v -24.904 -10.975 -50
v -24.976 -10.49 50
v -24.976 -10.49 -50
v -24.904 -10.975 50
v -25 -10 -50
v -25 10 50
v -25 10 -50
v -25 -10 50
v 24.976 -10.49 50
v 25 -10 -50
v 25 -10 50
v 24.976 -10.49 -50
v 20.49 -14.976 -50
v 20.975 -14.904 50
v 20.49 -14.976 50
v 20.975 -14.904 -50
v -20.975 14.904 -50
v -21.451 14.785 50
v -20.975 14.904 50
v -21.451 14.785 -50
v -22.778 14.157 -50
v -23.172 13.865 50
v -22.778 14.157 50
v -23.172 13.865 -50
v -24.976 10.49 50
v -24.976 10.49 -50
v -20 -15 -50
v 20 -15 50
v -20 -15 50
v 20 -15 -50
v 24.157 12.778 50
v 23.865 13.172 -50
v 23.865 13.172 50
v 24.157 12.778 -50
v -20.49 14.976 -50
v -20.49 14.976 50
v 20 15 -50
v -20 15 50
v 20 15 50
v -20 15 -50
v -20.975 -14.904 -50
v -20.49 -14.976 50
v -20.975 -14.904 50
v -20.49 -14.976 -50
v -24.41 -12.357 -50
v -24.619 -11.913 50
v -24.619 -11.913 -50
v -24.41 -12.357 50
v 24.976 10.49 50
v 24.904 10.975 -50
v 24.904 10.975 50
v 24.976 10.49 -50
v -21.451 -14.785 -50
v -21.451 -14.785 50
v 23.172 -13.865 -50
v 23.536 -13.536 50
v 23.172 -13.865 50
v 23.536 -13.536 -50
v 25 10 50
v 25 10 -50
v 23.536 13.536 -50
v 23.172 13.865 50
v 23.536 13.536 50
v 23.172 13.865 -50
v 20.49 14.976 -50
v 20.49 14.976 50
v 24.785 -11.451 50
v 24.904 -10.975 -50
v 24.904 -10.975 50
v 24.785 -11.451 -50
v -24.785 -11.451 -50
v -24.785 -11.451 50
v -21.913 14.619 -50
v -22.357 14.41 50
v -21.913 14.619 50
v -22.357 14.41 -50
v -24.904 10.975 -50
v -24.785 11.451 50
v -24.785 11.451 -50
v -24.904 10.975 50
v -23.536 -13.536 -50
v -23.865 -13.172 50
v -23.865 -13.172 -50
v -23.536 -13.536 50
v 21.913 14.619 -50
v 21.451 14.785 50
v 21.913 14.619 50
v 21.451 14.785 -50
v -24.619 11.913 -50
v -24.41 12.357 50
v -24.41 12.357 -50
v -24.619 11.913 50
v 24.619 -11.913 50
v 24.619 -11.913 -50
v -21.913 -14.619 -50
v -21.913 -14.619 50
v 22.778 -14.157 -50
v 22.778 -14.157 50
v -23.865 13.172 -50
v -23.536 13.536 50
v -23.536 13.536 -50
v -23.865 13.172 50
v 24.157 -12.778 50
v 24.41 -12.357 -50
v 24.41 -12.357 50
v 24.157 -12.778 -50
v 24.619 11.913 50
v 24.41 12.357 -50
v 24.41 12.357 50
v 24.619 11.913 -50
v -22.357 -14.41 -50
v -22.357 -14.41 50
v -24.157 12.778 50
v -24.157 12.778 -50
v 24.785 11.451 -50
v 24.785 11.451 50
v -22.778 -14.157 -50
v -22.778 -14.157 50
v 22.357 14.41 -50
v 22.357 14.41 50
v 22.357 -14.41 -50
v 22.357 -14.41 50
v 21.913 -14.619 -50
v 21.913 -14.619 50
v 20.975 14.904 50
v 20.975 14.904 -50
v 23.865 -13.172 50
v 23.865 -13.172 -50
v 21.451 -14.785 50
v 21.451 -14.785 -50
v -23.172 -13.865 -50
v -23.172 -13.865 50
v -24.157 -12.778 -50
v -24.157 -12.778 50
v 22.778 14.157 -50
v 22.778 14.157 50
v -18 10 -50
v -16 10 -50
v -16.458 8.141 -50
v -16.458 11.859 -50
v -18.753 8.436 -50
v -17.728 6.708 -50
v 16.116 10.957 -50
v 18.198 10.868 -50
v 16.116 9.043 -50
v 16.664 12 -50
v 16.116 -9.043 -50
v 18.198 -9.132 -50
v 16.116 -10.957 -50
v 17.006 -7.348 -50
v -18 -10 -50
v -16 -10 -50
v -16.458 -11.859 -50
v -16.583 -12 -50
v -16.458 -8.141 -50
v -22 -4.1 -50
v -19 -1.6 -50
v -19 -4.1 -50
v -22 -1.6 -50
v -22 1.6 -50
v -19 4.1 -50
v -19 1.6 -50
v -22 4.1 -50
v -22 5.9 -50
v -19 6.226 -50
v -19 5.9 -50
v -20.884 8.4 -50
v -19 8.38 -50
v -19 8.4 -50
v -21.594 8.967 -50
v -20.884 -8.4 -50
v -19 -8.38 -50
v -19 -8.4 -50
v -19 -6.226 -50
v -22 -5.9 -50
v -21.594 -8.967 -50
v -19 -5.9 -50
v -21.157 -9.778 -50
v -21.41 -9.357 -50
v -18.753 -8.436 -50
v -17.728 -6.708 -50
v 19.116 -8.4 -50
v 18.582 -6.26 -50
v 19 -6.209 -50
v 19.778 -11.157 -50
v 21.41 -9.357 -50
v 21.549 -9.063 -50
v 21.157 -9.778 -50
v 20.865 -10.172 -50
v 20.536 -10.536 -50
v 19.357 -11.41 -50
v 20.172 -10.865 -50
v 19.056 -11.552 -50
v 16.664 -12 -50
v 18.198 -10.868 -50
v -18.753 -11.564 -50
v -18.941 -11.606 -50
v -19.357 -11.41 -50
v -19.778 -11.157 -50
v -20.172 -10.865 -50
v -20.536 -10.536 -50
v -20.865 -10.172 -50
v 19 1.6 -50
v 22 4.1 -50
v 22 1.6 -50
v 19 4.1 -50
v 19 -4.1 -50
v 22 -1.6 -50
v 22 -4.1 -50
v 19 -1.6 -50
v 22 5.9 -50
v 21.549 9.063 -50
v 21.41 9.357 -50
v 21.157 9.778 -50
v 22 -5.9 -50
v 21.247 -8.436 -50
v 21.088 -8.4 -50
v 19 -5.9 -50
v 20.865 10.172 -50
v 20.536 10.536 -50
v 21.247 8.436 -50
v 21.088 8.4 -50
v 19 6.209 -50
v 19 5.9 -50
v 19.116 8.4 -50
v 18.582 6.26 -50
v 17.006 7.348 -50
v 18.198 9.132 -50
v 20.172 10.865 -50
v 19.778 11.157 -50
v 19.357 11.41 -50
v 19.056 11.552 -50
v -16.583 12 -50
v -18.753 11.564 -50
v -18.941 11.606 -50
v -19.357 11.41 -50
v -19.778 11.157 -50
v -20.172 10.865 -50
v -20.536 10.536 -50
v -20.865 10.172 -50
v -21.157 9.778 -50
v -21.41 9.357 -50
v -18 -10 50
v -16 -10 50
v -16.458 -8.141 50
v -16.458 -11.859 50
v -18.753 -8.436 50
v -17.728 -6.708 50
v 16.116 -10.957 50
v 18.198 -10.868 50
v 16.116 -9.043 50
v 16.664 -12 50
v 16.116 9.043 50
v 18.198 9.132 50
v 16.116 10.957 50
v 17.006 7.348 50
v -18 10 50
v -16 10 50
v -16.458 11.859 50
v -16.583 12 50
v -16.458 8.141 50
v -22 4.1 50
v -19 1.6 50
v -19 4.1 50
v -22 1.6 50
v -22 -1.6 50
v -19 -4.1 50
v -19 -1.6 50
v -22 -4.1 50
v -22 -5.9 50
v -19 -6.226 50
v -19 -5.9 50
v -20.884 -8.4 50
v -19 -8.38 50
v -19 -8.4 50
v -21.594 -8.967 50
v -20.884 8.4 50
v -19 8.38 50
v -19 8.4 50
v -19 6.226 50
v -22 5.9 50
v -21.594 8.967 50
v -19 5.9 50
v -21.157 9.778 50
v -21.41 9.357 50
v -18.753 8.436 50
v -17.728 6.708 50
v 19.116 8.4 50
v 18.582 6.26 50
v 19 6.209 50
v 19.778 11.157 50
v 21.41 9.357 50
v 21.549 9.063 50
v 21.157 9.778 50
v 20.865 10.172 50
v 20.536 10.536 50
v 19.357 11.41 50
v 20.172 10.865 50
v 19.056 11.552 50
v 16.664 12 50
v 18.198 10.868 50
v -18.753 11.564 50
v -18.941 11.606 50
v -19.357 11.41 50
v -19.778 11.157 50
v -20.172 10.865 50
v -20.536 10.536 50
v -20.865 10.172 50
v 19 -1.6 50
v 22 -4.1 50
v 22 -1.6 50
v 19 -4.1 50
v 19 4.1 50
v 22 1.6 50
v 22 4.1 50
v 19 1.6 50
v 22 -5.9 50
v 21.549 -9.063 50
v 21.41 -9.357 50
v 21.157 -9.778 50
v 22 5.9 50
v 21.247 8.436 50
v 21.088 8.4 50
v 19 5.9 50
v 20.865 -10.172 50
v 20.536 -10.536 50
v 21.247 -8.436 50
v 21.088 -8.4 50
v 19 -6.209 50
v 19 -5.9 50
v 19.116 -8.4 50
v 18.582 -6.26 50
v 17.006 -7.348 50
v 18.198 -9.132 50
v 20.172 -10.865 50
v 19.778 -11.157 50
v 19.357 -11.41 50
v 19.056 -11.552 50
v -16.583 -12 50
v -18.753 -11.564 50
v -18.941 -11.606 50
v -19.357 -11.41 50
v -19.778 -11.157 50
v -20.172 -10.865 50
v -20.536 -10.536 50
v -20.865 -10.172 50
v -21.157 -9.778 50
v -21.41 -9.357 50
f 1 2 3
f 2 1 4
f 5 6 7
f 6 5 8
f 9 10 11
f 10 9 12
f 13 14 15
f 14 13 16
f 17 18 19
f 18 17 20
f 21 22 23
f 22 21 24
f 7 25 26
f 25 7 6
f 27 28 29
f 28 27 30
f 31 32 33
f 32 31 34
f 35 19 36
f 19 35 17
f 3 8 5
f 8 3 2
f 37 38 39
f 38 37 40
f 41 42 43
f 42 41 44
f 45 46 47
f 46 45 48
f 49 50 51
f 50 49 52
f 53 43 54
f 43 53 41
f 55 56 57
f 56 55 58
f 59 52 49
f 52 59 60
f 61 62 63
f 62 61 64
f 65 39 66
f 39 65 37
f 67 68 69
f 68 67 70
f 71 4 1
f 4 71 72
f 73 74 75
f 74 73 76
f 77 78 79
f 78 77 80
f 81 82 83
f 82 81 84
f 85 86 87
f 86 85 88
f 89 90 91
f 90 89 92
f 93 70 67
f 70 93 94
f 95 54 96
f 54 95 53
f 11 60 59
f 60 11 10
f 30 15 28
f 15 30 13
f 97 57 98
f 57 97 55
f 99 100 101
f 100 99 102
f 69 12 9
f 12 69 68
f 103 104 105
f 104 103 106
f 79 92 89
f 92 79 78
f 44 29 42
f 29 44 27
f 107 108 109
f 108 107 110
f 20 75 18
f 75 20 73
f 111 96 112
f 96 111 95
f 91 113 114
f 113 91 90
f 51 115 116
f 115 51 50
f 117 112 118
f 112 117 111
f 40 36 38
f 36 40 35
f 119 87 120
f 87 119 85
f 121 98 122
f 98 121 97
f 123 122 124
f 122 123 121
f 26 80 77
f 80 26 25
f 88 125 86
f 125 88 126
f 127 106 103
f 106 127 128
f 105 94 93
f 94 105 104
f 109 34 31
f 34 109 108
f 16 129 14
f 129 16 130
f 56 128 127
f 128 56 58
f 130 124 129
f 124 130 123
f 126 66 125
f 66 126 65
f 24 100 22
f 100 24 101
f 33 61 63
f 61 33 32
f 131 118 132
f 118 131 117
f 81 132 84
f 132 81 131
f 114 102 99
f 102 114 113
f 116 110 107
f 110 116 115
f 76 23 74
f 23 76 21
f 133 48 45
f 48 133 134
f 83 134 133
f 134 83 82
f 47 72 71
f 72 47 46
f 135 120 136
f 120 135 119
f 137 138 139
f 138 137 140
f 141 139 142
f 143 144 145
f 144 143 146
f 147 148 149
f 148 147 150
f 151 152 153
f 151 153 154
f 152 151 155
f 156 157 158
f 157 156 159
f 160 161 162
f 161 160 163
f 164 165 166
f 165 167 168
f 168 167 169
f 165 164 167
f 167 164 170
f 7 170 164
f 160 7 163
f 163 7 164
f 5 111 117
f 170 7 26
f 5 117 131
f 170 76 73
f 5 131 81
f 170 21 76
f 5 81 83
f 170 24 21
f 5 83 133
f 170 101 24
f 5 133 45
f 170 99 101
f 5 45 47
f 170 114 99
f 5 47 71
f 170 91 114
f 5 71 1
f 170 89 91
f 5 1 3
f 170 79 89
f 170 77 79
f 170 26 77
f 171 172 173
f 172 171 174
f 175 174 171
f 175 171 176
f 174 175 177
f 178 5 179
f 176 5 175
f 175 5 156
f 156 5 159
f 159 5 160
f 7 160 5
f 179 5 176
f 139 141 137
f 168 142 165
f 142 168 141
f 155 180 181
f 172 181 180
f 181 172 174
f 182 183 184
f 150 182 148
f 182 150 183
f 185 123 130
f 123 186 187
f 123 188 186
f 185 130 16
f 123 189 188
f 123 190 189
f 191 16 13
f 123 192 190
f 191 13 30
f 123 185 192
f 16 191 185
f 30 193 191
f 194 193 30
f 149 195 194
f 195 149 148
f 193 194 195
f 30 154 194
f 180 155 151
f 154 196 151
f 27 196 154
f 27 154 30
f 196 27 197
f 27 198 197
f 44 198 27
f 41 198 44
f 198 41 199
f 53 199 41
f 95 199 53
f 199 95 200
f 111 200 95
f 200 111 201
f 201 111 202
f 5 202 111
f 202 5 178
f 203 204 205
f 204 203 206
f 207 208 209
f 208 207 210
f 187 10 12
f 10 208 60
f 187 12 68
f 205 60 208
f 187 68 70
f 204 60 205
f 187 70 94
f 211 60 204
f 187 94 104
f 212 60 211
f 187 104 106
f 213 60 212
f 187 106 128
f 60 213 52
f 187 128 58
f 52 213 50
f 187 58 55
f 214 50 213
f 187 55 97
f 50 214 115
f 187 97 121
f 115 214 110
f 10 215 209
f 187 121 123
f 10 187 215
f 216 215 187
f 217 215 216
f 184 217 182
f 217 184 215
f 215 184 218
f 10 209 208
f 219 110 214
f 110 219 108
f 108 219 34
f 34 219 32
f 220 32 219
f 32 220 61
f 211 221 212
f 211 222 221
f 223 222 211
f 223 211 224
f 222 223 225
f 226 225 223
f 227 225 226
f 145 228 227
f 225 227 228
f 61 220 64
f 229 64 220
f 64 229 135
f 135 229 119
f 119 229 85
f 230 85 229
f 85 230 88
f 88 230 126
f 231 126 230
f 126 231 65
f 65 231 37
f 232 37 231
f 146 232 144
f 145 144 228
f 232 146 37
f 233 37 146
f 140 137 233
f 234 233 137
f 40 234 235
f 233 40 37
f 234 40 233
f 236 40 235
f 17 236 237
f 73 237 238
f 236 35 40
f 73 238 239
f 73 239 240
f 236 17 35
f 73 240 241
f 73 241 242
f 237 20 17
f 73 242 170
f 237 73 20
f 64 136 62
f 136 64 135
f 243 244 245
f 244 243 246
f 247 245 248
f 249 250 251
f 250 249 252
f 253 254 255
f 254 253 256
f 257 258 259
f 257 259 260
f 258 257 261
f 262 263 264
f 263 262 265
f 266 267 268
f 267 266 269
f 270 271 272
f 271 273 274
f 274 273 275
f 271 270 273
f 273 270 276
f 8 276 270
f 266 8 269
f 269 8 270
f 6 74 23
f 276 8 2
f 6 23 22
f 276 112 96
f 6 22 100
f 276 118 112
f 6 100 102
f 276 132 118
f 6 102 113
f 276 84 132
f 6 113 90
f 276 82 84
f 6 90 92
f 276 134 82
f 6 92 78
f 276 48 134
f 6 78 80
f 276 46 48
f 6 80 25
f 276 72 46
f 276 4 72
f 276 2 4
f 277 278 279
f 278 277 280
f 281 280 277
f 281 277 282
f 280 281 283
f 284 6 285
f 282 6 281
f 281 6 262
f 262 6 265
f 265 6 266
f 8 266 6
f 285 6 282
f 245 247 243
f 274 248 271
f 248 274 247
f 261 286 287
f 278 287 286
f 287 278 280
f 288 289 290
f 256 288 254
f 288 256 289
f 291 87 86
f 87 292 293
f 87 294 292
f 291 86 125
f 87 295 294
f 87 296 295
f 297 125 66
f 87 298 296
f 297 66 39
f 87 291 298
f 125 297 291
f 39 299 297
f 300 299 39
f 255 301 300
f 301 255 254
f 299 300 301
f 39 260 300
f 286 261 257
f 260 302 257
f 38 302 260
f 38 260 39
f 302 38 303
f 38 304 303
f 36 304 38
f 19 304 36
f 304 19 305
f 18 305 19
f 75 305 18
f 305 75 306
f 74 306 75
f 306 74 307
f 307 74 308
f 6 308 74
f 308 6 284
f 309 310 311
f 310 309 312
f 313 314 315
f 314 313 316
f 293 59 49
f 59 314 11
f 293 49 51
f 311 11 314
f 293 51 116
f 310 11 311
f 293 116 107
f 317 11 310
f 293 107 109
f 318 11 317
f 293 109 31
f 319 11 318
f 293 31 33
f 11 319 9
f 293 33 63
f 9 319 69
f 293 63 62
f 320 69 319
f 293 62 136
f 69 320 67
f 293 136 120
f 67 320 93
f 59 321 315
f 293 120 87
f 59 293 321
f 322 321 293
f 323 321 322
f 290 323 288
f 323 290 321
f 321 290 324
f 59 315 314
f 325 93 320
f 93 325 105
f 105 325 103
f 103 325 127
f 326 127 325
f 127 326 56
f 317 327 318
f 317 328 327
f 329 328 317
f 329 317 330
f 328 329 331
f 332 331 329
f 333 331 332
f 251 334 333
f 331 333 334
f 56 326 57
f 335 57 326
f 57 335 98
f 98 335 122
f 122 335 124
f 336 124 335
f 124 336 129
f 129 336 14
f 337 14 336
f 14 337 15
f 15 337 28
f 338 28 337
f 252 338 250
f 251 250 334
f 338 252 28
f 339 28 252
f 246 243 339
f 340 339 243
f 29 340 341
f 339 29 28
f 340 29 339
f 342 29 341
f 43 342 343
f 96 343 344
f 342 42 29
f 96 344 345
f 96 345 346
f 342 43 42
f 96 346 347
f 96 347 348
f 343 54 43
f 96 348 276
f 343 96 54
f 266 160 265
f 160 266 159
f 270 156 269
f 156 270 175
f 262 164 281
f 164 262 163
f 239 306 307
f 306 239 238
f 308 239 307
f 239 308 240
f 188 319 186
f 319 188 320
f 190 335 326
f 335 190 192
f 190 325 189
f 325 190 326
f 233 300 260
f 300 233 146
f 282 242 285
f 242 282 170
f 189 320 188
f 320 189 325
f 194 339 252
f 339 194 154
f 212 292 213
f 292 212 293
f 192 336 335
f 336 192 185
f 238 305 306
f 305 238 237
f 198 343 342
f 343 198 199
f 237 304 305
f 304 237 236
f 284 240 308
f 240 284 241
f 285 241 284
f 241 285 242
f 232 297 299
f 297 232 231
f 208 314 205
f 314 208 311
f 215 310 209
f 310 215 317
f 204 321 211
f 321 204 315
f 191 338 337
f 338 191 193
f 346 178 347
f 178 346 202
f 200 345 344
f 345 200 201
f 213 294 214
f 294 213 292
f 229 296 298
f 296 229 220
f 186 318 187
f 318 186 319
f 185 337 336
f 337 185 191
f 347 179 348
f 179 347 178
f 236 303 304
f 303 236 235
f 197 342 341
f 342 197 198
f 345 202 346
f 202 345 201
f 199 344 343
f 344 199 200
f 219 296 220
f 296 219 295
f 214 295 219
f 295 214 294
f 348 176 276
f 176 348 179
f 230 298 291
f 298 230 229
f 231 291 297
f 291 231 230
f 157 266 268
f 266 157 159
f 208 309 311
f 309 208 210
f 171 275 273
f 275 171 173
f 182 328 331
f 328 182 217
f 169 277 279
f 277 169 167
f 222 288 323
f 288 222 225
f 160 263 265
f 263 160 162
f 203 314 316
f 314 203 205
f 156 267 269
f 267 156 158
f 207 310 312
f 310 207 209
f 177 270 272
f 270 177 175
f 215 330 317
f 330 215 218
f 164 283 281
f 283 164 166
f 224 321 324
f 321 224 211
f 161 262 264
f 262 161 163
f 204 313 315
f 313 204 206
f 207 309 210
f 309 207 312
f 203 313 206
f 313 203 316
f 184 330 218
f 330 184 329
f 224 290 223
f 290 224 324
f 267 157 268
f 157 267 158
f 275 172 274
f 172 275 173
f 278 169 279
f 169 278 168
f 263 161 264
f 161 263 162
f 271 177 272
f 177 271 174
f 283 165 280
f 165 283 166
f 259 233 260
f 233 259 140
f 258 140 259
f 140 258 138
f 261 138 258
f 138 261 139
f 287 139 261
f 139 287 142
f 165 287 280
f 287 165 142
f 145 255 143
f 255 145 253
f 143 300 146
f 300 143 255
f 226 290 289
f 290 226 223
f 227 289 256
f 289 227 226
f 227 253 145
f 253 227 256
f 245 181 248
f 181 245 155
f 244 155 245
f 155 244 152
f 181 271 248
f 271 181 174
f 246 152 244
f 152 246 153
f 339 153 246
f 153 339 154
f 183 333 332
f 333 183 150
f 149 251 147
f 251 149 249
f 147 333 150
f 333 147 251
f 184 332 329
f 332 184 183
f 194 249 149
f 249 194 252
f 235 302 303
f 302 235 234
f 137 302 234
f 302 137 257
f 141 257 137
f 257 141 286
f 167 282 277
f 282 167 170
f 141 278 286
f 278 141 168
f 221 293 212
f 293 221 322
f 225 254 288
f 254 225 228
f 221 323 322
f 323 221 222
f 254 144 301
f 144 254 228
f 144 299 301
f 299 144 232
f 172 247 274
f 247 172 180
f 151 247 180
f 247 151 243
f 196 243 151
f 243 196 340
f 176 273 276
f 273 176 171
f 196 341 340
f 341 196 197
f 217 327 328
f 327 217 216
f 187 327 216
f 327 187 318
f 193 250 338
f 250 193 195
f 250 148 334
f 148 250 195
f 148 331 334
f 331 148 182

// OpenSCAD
wall_thickness = 3;
edge_radius = 5;
box_height = 30;
box_width = 50;
box_length = 100;
corner_circle_div = 64;
slot_depth = 3;
slot_support_thickness = 2.5;
screw_inner_dia = 2;
screw_outer_dia = 4;

slot_heights_and_ypos = [
    [1.8, -5], [1.8, 5]
];

screw_hpos_and_ypos = [
    [-20, 10], [20, 10], [-20, -10], [20, -10]
];

module roundedRectangle(fullwidth,fullheight,zoffset,cornerradius) {
    width = abs(fullwidth) - 2*cornerradius;
    height = abs(fullheight) - 2*cornerradius;
    translate([0,0,zoffset])
    hull() {
        translate([-width/2,-height/2,0])
        circle(r=cornerradius,$fn=corner_circle_div);
        translate([width/2,-height/2,0])
        circle(r=cornerradius,$fn=corner_circle_div);
        translate([width/2,height/2,0])
        circle(r=cornerradius,$fn=corner_circle_div);
        translate([-width/2,height/2,0])
        circle(r=cornerradius,$fn=corner_circle_div);
    }
}

module roundedBox(fullwidth,fullheight,zoffset,cornerradius) {
    width = abs(fullwidth) - 2*cornerradius;
    height = abs(fullheight) - 2*cornerradius;
    translate([0,0,zoffset])
    hull() {
        translate([-width/2,-height/2,0])
        circle(r=cornerradius,$fn=corner_circle_div);
        translate([width/2,-height/2,0])
        circle(r=cornerradius,$fn=corner_circle_div);
        translate([width/2,height/2,0])
        circle(r=cornerradius,$fn=corner_circle_div);
        translate([-width/2,height/2,0])
        circle(r=cornerradius,$fn=corner_circle_div);
    }
}

module multiRods(rod_dia) {
    for (b = [ 0 : len(screw_hpos_and_ypos) - 1]) {
        screw = screw_hpos_and_ypos[b];
        translate([screw[0],screw[1]]) cylinder(h = box_length, r1 = rod_dia, r2 = rod_dia, center = true);
    }
}

module multiBoard() {
    for (a = [ 0 : len(slot_heights_and_ypos) - 1 ]) {
        board = slot_heights_and_ypos[a];
        translate([0,board[1],0]) cube(size=[box_width-2*wall_thickness, board[0], box_length], center=true);
    }
}

module multiBoardSupports() {
    for (a = [ 0 : len(slot_heights_and_ypos) - 1 ]) {
        board = slot_heights_and_ypos[a];
        translate([0,board[1],0]) cube(size=[box_width-2*wall_thickness, (board[0]+2*slot_support_thickness), box_length], center=true);
    }
}

difference() {
    linear_extrude(height = box_length, center = true) {
        roundedRectangle(box_width,box_height,(-0.5*box_length),edge_radius);
    }
    linear_extrude(height = box_length, center = true) { 
        roundedRectangle(box_width-2*wall_thickness,box_height-2*wall_thickness,(-0.5*box_length),edge_radius);
    }
}

difference() {
    difference() {
        multiBoardSupports();
        multiBoard();
    }
    cube(size=[box_width-2*wall_thickness-2*slot_depth, box_height, box_length], center=true);
}
difference() {
    multiRods(screw_outer_dia);
    multiRods(screw_inner_dia);
}


/*
hull() {
    translate([50,25,30])
    sphere(10);
    translate([25,30,10])
    cube(10);
}

    hull() {
      translate([0, 10])
      circle(10);
      translate([0, -10])
      circle(10);
    }
*/
